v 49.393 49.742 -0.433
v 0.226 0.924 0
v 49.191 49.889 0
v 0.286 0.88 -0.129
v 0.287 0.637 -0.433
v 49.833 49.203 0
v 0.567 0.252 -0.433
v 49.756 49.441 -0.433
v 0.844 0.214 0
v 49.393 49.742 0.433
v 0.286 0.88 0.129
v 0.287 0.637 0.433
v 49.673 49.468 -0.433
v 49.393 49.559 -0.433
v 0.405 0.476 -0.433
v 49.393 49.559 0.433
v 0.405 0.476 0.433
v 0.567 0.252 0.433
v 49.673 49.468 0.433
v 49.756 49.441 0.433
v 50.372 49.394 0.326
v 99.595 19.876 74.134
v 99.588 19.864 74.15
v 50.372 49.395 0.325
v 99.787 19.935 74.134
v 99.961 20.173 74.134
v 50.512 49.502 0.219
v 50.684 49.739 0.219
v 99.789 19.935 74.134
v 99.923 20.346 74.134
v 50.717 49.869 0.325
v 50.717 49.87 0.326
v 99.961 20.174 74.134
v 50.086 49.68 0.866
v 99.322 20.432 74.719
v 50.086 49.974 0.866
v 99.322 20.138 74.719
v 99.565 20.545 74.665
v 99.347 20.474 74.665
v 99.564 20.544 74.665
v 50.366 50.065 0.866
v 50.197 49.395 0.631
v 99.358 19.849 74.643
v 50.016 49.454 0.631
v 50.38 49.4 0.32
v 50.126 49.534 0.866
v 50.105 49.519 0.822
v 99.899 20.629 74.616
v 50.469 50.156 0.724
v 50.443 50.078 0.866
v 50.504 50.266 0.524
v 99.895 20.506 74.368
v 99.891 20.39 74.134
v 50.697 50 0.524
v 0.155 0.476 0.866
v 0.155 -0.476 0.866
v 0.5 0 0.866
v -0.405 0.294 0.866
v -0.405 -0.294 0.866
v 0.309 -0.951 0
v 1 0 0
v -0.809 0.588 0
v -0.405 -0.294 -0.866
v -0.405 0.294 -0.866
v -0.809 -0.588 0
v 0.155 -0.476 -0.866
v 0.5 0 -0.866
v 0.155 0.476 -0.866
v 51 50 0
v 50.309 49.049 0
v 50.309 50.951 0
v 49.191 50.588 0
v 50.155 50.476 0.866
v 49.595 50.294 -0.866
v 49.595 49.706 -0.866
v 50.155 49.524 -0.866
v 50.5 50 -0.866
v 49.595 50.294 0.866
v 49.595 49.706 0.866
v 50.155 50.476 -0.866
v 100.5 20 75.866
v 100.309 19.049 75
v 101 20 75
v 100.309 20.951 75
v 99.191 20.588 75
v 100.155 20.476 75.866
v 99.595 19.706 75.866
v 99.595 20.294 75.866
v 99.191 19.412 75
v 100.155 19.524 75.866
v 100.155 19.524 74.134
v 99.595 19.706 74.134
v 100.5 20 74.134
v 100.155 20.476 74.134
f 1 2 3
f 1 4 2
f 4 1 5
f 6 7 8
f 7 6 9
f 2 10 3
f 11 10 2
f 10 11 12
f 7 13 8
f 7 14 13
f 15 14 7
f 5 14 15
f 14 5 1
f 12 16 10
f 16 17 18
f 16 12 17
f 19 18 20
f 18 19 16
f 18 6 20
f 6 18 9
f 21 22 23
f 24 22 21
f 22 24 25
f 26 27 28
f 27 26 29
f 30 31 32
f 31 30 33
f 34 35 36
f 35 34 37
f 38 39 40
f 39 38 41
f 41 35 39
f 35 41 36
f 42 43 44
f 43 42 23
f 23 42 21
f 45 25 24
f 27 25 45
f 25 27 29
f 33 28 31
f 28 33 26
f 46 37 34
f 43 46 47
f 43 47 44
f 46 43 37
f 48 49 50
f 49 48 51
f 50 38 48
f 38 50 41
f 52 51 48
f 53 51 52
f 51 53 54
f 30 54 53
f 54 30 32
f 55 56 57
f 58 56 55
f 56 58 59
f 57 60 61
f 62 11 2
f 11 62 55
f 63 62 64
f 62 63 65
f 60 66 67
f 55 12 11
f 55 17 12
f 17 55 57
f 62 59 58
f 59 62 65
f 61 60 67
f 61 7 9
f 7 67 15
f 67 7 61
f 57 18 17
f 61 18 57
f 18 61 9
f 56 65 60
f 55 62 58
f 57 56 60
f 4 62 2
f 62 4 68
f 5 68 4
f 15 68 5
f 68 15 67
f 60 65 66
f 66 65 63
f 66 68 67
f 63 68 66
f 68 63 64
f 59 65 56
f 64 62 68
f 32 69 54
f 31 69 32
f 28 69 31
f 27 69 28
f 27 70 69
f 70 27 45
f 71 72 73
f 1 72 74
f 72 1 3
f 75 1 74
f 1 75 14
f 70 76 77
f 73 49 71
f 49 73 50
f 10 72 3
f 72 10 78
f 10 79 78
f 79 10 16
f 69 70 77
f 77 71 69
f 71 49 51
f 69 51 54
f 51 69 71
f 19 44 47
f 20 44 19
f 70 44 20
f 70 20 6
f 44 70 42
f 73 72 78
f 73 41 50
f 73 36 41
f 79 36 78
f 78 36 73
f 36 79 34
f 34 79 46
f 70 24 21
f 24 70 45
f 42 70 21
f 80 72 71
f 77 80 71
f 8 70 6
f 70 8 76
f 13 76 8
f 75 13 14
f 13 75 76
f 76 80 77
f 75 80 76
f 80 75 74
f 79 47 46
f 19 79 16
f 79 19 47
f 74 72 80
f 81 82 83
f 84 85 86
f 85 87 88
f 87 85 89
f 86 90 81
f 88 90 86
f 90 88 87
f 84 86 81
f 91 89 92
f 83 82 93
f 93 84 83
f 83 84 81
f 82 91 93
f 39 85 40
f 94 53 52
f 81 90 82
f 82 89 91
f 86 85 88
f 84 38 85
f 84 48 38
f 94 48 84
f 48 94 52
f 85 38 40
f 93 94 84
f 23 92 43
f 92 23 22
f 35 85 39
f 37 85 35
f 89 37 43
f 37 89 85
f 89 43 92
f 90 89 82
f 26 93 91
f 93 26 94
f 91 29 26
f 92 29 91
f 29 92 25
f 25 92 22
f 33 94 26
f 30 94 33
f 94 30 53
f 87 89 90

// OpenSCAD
$fn=5;
union()
{
	union()
	{
		hull()
		{
			translate([0,0,0])
			{
				rotate(0,[0,0,1])
				{
					sphere(d=1);
				}
			}
			translate([50,50,0])
			{
				rotate(0,[0,0,1])
				{
					sphere(d=1);
				}
			}
		}
		hull()
		{
			translate([50,50,0])
			{
				rotate(0,[0,0,1])
				{
					sphere(d=1);
				}
			}
			translate([100,20,75])
			{
				rotate(0,[0,0,1])
				{
					sphere(d=1);
				}
			}
		}
	}
	union()
	{
		translate([0,0,0])
		{
			rotate(0,[0,0,1])
			{
				sphere(d=2);
			}
		}
		translate([50,50,0])
		{
			rotate(0,[0,0,1])
			{
				sphere(d=2);
			}
		}
		translate([100,20,75])
		{
			rotate(0,[0,0,1])
			{
				sphere(d=2);
			}
		}
	}
}
